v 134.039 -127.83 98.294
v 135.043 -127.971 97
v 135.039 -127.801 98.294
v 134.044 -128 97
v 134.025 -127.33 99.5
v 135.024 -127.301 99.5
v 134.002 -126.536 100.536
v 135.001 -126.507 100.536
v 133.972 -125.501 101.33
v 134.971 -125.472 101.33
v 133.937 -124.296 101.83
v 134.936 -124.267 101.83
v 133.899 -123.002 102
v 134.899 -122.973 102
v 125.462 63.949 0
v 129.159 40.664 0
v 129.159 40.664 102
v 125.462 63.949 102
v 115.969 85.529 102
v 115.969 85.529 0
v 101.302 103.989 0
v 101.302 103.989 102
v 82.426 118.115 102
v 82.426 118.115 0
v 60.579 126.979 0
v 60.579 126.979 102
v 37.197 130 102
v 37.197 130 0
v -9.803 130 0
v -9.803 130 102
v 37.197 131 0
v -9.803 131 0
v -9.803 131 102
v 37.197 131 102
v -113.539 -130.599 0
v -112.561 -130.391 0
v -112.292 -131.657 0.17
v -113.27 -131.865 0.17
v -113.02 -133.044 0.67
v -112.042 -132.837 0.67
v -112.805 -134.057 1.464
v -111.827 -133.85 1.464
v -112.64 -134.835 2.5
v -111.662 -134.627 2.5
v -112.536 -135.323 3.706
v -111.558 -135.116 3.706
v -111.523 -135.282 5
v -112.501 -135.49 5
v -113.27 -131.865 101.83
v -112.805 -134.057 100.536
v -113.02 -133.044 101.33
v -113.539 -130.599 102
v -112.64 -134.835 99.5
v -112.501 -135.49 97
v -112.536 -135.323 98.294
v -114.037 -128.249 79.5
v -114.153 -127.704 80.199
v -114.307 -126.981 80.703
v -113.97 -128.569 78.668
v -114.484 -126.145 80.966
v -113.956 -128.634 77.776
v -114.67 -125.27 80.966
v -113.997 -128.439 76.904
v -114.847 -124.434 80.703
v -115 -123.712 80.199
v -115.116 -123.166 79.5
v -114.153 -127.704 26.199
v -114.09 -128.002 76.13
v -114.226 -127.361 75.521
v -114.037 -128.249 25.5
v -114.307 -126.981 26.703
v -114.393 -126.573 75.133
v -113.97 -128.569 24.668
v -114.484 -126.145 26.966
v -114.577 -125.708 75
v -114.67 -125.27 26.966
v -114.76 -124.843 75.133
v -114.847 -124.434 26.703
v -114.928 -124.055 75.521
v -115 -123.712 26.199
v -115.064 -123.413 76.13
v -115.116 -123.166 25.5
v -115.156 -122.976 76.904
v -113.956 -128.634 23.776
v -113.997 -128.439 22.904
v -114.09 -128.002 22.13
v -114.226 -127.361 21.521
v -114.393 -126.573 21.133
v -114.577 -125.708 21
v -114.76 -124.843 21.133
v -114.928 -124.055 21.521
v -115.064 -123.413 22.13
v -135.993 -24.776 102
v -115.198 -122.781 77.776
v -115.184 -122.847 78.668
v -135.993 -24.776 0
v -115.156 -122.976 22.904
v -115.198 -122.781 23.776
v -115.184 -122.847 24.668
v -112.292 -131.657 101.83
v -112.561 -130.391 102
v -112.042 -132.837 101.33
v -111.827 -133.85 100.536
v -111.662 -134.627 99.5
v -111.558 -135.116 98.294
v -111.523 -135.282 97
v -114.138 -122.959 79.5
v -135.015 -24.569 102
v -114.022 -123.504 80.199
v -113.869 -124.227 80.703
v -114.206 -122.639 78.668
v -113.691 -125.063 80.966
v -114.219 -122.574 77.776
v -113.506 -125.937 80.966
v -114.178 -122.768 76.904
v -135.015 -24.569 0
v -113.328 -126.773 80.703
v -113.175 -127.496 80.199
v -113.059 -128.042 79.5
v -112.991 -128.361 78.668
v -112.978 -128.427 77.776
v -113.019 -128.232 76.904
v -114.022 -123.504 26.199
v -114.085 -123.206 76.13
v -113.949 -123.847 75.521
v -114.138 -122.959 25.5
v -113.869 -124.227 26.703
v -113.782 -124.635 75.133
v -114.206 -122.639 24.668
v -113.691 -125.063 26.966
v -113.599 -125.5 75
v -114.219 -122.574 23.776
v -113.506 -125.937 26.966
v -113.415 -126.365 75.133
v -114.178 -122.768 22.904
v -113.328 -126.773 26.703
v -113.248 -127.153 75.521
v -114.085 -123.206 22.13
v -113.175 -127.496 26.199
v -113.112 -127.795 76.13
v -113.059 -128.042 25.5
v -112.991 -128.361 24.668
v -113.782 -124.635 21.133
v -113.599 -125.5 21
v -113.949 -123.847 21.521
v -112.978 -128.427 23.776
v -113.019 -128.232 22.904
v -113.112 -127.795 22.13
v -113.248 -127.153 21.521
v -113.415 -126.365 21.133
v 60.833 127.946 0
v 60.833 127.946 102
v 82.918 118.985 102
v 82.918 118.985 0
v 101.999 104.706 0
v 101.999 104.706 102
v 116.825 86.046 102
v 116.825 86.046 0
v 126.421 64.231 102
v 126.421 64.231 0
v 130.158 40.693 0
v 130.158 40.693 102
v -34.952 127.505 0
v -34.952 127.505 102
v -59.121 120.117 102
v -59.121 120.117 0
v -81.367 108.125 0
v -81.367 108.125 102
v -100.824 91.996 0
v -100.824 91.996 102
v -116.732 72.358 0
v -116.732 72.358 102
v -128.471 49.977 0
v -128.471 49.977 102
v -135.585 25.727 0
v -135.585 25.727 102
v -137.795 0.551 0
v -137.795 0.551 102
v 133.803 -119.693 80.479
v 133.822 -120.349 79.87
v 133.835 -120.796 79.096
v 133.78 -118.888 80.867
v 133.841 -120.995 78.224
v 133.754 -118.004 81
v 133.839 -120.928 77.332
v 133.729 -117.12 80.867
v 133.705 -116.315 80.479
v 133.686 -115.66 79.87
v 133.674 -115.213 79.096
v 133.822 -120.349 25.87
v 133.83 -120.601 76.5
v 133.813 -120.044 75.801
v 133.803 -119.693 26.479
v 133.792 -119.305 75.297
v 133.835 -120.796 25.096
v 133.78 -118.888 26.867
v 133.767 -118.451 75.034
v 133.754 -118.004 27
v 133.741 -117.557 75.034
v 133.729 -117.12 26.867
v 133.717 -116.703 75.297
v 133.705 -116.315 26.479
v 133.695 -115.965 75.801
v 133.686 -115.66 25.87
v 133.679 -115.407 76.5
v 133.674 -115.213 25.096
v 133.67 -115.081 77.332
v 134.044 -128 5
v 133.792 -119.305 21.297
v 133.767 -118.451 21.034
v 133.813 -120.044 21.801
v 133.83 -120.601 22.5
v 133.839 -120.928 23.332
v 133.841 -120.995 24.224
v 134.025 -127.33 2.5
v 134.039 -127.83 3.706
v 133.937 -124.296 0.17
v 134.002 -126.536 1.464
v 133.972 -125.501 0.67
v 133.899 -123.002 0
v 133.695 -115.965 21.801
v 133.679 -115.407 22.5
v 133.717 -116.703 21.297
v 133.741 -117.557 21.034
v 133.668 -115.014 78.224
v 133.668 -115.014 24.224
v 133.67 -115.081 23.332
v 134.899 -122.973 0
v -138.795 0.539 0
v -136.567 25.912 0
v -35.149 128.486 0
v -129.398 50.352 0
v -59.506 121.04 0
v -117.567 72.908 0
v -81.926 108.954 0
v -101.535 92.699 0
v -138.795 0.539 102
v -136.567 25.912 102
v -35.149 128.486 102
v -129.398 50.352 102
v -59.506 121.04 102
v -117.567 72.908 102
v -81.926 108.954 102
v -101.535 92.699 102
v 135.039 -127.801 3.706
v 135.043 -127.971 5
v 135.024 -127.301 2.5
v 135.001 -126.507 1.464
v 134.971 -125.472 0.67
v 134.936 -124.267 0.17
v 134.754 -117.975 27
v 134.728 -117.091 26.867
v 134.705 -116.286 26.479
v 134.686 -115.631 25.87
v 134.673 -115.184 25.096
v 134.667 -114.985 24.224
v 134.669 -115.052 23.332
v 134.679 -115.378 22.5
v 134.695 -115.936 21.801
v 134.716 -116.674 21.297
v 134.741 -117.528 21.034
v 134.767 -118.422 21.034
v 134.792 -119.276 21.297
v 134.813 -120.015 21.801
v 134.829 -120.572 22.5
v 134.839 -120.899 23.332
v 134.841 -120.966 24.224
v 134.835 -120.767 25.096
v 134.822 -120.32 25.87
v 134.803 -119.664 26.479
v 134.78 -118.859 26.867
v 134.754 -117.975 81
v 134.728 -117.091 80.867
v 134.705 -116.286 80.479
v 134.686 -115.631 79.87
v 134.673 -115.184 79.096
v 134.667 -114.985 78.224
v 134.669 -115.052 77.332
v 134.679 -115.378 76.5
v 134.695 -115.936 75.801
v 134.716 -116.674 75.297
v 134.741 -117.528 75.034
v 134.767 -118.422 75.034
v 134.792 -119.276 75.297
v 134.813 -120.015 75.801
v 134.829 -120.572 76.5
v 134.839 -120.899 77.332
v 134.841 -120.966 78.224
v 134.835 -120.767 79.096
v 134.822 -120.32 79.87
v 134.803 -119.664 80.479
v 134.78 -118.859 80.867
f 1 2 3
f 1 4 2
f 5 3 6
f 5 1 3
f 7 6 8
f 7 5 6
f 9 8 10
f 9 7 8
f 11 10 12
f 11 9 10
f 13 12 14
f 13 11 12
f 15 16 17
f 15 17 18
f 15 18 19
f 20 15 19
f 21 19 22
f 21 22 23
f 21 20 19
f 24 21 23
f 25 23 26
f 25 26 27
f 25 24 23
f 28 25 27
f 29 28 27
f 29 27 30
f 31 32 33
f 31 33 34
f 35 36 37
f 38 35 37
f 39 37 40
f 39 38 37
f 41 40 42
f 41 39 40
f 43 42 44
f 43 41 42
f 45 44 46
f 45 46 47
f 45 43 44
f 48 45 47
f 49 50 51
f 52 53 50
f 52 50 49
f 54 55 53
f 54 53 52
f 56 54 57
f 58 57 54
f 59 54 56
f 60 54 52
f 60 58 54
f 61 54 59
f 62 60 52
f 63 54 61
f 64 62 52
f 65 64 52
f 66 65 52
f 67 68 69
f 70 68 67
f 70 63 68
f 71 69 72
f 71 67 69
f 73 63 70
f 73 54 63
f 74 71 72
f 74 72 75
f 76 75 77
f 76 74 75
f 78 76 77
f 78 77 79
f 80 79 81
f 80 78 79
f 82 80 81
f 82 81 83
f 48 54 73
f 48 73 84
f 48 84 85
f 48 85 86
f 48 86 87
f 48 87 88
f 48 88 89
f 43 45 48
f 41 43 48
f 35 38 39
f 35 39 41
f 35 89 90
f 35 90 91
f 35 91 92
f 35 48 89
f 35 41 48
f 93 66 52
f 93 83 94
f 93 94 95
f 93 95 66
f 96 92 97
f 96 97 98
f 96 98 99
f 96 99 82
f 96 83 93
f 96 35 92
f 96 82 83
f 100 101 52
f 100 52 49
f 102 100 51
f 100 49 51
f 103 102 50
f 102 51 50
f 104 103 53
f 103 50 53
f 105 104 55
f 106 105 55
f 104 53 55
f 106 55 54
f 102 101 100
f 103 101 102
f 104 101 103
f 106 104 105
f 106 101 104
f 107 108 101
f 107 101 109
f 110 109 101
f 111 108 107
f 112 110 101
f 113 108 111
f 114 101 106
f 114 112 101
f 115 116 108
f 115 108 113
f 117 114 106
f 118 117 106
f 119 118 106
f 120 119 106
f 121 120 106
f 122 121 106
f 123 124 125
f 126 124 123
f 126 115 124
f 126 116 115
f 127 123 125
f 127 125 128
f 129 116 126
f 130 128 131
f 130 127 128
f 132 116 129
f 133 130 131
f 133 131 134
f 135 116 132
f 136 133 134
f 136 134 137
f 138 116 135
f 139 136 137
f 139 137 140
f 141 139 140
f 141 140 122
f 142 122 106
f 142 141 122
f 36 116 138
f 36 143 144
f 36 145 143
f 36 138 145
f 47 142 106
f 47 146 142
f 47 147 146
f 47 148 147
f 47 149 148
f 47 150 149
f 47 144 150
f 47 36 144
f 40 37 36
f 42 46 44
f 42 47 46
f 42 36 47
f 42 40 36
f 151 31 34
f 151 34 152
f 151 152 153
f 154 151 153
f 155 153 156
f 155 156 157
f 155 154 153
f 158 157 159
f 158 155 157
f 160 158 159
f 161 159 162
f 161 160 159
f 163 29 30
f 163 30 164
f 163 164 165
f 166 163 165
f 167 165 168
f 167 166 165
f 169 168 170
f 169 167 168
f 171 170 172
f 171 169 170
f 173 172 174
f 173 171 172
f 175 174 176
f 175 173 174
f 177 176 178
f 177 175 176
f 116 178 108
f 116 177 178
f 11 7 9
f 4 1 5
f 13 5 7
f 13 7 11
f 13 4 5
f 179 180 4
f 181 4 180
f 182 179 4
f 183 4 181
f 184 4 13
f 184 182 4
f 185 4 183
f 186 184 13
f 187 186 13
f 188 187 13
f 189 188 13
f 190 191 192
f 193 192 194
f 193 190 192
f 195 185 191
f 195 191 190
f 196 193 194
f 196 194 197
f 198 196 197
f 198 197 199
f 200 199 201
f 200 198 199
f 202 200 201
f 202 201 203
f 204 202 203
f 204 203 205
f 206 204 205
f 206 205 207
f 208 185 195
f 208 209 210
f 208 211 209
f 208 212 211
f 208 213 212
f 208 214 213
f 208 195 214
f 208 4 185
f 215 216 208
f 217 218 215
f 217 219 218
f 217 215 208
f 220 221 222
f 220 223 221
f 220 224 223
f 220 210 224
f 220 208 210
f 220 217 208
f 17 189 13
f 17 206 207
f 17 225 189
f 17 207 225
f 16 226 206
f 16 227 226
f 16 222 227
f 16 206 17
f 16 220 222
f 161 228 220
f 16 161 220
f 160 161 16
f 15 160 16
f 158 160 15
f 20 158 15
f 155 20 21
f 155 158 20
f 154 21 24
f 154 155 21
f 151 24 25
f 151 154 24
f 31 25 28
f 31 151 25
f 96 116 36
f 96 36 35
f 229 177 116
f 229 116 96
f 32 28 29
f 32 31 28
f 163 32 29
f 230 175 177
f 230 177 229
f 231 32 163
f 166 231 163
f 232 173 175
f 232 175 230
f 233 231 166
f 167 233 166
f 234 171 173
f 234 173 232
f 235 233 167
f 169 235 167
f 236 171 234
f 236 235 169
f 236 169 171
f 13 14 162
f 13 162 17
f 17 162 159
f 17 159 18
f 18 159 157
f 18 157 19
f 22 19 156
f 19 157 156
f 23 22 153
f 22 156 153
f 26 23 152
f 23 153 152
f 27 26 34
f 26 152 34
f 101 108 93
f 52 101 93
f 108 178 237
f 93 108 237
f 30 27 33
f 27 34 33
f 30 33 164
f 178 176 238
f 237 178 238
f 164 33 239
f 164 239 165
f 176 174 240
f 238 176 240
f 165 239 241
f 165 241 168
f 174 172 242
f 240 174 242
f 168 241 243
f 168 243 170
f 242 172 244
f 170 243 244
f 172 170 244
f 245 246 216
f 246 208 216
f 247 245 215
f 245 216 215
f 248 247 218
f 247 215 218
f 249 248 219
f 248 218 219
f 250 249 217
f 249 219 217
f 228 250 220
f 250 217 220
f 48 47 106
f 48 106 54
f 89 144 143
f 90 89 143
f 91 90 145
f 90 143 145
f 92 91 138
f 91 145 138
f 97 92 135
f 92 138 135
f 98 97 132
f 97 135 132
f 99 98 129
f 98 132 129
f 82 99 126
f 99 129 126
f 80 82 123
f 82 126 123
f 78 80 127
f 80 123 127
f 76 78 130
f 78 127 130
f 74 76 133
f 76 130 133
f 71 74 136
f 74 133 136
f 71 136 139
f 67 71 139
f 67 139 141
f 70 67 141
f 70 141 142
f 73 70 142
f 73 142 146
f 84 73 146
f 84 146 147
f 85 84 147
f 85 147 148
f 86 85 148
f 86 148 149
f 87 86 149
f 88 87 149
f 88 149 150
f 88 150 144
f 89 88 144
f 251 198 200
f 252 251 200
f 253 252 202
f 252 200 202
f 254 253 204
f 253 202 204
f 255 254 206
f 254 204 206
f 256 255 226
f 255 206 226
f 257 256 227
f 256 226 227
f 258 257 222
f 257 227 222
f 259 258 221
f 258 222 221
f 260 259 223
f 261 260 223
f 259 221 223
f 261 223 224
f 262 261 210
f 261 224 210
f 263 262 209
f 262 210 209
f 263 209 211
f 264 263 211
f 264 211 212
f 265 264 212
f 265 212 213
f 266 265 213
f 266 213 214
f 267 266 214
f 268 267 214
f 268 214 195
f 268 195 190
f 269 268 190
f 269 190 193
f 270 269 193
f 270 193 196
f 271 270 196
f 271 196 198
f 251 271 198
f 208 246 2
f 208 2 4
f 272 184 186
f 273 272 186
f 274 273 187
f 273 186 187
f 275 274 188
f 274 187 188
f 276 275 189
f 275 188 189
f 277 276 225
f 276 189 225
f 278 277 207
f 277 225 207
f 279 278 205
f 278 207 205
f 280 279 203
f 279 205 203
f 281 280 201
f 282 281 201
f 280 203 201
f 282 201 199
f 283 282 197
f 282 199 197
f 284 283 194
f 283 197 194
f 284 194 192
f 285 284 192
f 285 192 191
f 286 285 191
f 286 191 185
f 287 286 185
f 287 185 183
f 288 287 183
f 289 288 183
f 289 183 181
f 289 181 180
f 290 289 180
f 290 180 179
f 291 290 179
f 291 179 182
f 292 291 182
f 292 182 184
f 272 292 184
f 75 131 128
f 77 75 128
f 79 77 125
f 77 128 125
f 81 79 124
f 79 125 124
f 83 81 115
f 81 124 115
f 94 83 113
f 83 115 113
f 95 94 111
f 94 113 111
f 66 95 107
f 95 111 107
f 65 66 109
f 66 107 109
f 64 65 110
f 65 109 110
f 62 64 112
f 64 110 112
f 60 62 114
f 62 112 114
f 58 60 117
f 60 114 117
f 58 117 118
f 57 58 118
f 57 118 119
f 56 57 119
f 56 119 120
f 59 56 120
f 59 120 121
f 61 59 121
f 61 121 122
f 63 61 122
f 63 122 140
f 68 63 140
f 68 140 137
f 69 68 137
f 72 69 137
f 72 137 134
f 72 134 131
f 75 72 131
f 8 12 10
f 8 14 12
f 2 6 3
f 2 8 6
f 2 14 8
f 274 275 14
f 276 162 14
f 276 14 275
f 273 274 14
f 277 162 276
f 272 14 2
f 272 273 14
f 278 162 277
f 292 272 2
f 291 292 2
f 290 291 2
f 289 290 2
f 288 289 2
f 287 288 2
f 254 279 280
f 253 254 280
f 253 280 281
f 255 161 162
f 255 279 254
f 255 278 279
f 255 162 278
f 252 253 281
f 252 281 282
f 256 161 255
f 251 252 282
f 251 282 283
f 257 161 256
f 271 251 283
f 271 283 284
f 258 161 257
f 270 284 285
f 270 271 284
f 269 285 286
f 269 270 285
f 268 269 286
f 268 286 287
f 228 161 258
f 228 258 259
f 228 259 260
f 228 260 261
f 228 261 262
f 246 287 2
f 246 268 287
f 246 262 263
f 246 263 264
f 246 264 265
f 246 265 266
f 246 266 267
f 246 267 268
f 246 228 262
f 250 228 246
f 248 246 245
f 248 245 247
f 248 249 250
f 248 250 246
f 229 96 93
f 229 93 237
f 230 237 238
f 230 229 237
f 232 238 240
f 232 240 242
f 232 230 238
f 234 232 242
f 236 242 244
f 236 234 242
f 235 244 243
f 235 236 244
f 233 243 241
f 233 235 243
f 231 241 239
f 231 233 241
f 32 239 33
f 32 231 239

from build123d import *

# Parameters (mm, degrees)
WYCI_GNI_CIE_CIENKA_CIANKA1_DEPTH = 102
OTW_R1_D                          = 6
OTW_R1_DEPTH                      = 1
OTW_R2_D                          = 6
OTW_R2_DEPTH                      = 1
ZAOKR_GLENIE1_R                   = 5
OTW_R3_D                          = 6
OTW_R3_DEPTH                      = 1
OTW_R4_D                          = 6
OTW_R4_DEPTH                      = 1


with BuildPart() as part:
    # Szkic1 → Wyciągnięcie-cienka ścianka1 (new body)
    with BuildSketch(Plane.XY):
        with BuildLine():
            Line((134.043918698, -128), (129.158561205, 40.663670642))
            ThreePointArc((129.158561205, 40.663670642), (101.302286813, 103.988853979), (37.19712984, 130))
            Line((37.19712984, 130), (-9.80287016, 130))
            ThreePointArc((-9.80287016, 130), (-109.26340878, 82.570473856), (-135.015100263, -24.568730353))
            Line((-135.015100263, -24.568730353), (-111.522833189, -135.282306482))
            Line((-111.522833189, -135.282306482), (-112.501053736, -135.489874688))
            Line((-112.501053736, -135.489874688), (-135.993320811, -24.776298559))
            ThreePointArc((-135.993320811, -24.776298559), (-110.040444238, 83.199930683), (-9.80287016, 131))
            Line((-9.80287016, 131), (37.19712984, 131))
            ThreePointArc((37.19712984, 131), (101.999081998, 104.706124131), (130.158141981, 40.692623583))
            Line((130.158141981, 40.692623583), (135.043499474, -127.971047058))
            Line((135.043499474, -127.971047058), (134.043918698, -128))
        make_face()
    extrude(amount=WYCI_GNI_CIE_CIENKA_CIANKA1_DEPTH)

    # Otwór1
    with Locations(Plane(origin=(131.226711189, 3.800992794, 0), x_dir=(0, 0, -1), z_dir=(0.999580776, 0.028952942, 0))):
        with Locations((-78, -121.827305061)):
            Hole(OTW_R1_D / 2, depth=OTW_R1_DEPTH)

    # Otwór2
    with Locations(Plane(origin=(131.226711189, 3.800992794, 0), x_dir=(0, 0, -1), z_dir=(0.999580776, 0.028952942, 0))):
        with Locations((-24, -121.827305061)):
            Hole(OTW_R2_D / 2, depth=OTW_R2_DEPTH)

    # Zaokrąglenie1
    zaokr_glenie1_edges = [part.edges().sort_by_distance(p)[0] for p in [
        (134.543709086, -127.985523529, 0),
        (-112.011943462, -135.386090585, 0),
        (134.543709086, -127.985523529, 102),
        (-112.011943462, -135.386090585, 102),
    ]]
    fillet(zaokr_glenie1_edges, radius=ZAOKR_GLENIE1_R)

    # Otwór3
    with Locations(Plane(origin=(-135.164873494, -28.680577561, 0), x_dir=(0, 0, 1), z_dir=(-0.978220548, -0.207568206, 0))):
        with Locations((24, -99.187337539)):
            Hole(OTW_R3_D / 2, depth=OTW_R3_DEPTH)

    # Otwór4
    with Locations(Plane(origin=(-135.164873494, -28.680577561, 0), x_dir=(0, 0, 1), z_dir=(-0.978220548, -0.207568206, 0))):
        with Locations((78, -99.187337539)):
            Hole(OTW_R4_D / 2, depth=OTW_R4_DEPTH)


solid = part.part
